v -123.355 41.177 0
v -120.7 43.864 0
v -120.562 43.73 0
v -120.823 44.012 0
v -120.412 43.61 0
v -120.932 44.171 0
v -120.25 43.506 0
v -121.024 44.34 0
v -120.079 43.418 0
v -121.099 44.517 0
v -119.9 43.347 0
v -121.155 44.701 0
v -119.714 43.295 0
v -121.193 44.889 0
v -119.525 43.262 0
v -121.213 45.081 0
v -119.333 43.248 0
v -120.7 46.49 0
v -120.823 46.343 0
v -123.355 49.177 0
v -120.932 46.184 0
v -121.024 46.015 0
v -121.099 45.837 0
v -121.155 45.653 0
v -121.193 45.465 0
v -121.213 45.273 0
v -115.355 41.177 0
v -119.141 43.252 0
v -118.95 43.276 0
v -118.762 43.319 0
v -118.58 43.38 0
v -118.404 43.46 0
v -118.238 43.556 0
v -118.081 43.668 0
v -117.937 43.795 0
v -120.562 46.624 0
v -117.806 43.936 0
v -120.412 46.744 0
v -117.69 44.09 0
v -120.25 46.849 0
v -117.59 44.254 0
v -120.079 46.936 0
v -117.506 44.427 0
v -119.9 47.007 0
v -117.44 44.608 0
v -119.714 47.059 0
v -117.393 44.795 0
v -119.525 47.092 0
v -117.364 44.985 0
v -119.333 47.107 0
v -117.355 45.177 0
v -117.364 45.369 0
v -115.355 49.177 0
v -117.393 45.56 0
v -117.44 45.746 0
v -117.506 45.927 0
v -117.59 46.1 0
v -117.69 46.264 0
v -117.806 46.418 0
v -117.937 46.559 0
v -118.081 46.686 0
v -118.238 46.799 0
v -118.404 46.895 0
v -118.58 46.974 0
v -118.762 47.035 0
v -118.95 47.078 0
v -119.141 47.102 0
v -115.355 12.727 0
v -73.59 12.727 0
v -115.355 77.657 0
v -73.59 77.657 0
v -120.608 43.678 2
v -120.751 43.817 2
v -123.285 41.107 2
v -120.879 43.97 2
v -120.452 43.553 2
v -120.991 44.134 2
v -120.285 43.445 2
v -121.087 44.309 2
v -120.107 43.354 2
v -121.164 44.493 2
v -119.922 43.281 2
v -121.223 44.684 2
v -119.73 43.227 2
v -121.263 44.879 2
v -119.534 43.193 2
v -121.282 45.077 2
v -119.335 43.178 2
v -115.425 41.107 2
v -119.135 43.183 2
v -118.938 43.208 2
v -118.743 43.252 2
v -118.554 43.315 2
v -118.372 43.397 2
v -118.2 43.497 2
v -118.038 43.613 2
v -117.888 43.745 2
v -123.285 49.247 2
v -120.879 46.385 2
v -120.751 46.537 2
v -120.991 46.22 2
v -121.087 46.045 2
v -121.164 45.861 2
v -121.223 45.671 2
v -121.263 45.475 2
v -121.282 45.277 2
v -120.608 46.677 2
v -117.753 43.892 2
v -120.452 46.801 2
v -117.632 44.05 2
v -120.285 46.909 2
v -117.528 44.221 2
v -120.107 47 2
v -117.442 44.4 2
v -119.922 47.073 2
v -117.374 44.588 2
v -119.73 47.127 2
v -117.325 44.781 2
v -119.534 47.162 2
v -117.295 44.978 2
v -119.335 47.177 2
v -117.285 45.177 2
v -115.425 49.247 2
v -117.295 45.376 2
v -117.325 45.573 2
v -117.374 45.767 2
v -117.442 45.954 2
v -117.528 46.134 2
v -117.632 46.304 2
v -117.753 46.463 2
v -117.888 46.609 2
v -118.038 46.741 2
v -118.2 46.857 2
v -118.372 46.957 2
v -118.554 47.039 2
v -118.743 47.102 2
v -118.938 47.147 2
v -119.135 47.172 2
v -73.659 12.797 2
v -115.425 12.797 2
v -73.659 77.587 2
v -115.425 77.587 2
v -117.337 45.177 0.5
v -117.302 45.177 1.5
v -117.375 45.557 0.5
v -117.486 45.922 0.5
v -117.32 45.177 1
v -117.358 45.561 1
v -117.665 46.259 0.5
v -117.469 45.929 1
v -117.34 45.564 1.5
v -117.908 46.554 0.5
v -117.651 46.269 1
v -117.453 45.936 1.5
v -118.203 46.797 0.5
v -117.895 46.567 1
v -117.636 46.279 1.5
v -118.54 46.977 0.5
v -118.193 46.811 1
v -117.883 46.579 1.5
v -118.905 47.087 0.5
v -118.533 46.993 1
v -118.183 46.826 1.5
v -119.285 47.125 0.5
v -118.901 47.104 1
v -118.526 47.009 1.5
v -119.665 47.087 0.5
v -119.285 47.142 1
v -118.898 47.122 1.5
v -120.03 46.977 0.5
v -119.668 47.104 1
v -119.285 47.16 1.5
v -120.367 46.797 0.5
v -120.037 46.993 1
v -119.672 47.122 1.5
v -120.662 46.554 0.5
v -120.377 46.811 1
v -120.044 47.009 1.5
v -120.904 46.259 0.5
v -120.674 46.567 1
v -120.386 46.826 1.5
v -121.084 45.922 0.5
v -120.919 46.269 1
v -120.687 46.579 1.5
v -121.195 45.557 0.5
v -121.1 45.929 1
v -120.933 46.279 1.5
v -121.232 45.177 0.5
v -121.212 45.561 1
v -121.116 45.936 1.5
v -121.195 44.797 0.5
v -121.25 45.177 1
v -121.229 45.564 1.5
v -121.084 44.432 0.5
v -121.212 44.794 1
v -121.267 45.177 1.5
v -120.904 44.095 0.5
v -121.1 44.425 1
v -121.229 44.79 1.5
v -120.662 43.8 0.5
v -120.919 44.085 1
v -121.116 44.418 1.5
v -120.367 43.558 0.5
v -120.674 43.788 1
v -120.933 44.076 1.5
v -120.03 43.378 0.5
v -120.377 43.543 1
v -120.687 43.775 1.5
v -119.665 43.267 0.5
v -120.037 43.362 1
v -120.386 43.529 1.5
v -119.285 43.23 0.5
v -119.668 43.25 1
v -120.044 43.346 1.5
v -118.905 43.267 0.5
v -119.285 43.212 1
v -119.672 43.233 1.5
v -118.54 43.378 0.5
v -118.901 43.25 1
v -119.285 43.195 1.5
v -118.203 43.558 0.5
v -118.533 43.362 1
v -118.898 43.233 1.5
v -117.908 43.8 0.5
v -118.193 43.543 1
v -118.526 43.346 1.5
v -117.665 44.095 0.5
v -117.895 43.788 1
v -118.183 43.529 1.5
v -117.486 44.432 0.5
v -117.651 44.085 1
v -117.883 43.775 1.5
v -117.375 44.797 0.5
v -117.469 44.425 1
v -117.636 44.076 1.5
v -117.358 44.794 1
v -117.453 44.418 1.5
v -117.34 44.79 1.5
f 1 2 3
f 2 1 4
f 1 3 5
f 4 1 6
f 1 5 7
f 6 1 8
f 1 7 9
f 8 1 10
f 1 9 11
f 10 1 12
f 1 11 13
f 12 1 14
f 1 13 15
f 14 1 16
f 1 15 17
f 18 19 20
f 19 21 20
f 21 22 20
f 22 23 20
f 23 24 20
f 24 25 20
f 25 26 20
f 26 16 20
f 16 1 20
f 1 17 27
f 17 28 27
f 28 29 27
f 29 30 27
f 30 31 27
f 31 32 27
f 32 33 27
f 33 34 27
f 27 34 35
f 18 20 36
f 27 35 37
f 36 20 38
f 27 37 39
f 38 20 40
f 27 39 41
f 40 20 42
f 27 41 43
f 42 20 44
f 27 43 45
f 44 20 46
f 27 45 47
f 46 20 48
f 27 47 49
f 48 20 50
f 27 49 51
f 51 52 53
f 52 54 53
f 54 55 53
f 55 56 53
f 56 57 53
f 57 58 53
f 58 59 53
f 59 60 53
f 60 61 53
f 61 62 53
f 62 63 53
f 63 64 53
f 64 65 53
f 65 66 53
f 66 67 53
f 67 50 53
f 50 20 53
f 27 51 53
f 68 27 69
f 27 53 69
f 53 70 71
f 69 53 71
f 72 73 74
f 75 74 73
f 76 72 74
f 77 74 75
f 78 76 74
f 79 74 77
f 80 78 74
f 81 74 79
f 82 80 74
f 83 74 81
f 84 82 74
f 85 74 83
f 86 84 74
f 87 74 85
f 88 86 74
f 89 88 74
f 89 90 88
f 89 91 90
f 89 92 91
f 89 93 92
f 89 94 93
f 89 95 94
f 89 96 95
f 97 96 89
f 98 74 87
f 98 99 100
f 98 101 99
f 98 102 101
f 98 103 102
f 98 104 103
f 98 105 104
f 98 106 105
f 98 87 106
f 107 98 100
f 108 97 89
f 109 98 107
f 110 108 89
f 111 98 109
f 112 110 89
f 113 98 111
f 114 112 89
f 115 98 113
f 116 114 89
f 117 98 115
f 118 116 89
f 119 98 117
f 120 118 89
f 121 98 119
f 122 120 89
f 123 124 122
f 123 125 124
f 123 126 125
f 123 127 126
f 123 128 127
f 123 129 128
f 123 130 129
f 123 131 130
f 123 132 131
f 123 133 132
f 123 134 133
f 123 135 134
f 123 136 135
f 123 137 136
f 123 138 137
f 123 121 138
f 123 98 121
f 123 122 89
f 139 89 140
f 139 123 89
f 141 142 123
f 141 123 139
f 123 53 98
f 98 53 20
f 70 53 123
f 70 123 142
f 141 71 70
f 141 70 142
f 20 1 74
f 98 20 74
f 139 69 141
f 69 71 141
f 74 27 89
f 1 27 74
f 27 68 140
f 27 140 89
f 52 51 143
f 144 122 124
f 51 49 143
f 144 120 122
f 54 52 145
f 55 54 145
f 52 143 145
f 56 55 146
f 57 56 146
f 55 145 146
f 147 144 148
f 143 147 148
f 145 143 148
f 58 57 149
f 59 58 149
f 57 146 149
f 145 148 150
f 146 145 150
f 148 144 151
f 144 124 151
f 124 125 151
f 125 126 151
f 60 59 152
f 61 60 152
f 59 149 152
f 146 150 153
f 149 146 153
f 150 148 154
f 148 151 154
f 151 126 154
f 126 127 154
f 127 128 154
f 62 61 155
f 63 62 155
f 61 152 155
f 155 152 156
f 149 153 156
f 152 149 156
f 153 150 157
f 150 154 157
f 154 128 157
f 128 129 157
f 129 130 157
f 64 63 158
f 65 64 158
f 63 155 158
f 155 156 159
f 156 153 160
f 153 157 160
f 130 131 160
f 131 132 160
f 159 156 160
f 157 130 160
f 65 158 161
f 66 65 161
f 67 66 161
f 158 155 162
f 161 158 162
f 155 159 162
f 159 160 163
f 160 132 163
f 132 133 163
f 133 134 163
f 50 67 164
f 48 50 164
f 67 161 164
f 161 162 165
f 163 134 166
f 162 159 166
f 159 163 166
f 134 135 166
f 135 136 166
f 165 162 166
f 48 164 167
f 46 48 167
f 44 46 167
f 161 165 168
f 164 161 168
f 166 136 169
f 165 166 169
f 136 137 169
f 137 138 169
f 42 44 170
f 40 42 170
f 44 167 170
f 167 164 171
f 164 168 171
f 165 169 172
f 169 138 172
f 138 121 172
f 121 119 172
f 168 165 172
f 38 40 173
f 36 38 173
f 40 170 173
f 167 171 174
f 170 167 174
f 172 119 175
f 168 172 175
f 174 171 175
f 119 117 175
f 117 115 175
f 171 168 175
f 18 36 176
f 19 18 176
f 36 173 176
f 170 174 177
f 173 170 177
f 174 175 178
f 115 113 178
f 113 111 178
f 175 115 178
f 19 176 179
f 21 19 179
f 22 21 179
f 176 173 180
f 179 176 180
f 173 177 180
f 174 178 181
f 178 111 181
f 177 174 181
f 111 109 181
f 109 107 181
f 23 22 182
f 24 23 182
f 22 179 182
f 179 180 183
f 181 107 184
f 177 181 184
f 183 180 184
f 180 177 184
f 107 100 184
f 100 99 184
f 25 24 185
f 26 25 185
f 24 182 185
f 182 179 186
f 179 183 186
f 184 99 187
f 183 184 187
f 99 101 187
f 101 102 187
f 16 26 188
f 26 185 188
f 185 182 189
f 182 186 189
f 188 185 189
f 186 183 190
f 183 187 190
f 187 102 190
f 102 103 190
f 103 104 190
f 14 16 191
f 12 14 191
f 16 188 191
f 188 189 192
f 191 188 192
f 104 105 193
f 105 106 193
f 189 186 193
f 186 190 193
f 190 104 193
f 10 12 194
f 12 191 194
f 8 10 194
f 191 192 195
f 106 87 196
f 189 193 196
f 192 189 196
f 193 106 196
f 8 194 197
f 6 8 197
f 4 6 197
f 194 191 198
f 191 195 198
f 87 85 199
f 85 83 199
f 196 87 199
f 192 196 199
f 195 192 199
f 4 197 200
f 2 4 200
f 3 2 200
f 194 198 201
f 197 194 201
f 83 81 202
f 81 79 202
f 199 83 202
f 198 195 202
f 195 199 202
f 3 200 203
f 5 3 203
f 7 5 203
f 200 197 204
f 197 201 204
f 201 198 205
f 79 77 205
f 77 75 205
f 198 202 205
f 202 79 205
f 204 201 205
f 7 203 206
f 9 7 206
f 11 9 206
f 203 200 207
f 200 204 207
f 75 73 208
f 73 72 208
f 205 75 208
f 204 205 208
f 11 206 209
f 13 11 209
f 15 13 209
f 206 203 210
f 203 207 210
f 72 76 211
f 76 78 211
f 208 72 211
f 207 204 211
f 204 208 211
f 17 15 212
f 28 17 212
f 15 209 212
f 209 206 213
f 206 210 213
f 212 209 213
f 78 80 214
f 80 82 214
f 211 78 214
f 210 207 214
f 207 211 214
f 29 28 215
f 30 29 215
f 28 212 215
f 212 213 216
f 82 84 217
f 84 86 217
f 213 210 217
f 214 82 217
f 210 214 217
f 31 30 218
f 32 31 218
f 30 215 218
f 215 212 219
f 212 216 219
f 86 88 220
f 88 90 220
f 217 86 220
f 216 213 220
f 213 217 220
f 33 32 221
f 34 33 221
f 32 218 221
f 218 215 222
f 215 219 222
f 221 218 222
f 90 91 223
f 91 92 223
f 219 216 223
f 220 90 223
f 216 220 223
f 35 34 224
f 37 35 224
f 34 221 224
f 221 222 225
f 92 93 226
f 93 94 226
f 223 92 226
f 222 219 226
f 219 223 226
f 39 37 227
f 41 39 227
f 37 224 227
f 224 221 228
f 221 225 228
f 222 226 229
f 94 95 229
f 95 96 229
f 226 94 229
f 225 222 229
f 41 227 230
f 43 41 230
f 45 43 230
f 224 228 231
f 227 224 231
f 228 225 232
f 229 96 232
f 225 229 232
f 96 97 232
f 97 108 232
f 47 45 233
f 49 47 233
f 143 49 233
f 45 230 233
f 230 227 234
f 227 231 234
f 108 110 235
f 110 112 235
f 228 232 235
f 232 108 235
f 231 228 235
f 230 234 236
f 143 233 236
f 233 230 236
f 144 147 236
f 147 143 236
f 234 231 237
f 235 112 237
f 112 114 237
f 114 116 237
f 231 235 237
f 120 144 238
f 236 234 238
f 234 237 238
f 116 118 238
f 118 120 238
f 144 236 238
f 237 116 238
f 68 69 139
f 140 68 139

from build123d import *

# Parameters (mm, degrees)
SKETCH1_W                    = 49.765070753
SKETCH1_H                    = 64.93
BOSS_EXTRUDE1_DEPTH          = 2
BOSS_EXTRUDE1_TAPER          = 2
SKETCH3_R                    = 2
CUT_EXTRUDE2_DEPTH           = 2
CUT_EXTRUDE2_DRAFT           = -2
SKETCH4_W                    = 8
SKETCH4_H                    = 28.479841539
CUT_EXTRUDE3_DEPTH           = 2
CUT_EXTRUDE3_DRAFT           = -2
SKETCH4_H_2                  = 28.450158461
CUT_EXTRUDE3_PROFILE_2_DEPTH = 2
CUT_EXTRUDE3_PROFILE_2_DRAFT = -2


with BuildPart() as part:
    # Sketch1 → Boss-Extrude1 (new body)
    with BuildSketch(Plane.XY):
        with Locations((-98.472172046, 45.191977318)):
            Rectangle(SKETCH1_W, SKETCH1_H)
    extrude(amount=BOSS_EXTRUDE1_DEPTH, taper=BOSS_EXTRUDE1_TAPER)


with BuildPart() as cut_extrude2_tool:
    # Sketch3 → Cut-Extrude2 (with draft: the straight prism first)
    with BuildSketch(Plane.XY.offset(2)):
        with Locations((-119.284865883, 45.177135779)):
            Circle(SKETCH3_R)
    extrude(amount=-CUT_EXTRUDE2_DEPTH)
    # Cut-Extrude2: the draft: its side faces are tilted about the plane it starts from
    cut_extrude2_sides = [cut_extrude2_tool.faces().sort_by_distance(p)[0] for p in [
        (-121.284865883, 45.177135779, 1),
    ]]
    draft(cut_extrude2_sides, Plane.XY.offset(2), CUT_EXTRUDE2_DRAFT)


with BuildPart() as part_1:
    add(part.part)

    # Cut-Extrude2: cut by cut_extrude2_tool
    add(cut_extrude2_tool.part, mode=Mode.SUBTRACT)


with BuildPart() as cut_extrude3_tool:
    # Sketch4 → Cut-Extrude3 (with draft: the straight prism first)
    with BuildSketch(Plane(origin=(0, 0, 0), x_dir=(-1, 0, 0), z_dir=(0, 0, -1))):
        with Locations((119.354707422, 63.417056548)):
            Rectangle(SKETCH4_W, SKETCH4_H)
    extrude(amount=-CUT_EXTRUDE3_DEPTH)
    # Cut-Extrude3: the draft: its side faces are tilted about the plane it starts from
    cut_extrude3_sides = [cut_extrude3_tool.faces().sort_by_distance(p)[0] for p in [
        (-119.354707422, 77.656977318, 1),
        (-115.354707422, 63.417056548, 1),
        (-119.354707422, 49.177135779, 1),
        (-123.354707422, 63.417056548, 1),
    ]]
    draft(cut_extrude3_sides, Plane(origin=(0, 0, 0), x_dir=(-1, 0, 0), z_dir=(0, 0, -1)), CUT_EXTRUDE3_DRAFT)


with BuildPart() as part_2:
    add(part_1.part)

    # Cut-Extrude3: cut by cut_extrude3_tool
    add(cut_extrude3_tool.part, mode=Mode.SUBTRACT)


with BuildPart() as cut_extrude3_profile_2_tool:
    # Sketch4 → Cut-Extrude3 profile 2 (with draft: the straight prism first)
    with BuildSketch(Plane(origin=(0, 0, 0), x_dir=(-1, 0, 0), z_dir=(0, 0, -1))):
        with Locations((119.354707422, 26.952056549)):
            Rectangle(SKETCH4_W, SKETCH4_H_2)
    extrude(amount=-CUT_EXTRUDE3_PROFILE_2_DEPTH)
    # Cut-Extrude3 profile 2: the draft: its side faces are tilted about the plane it starts from
    cut_extrude3_profile_2_sides = [cut_extrude3_profile_2_tool.faces().sort_by_distance(p)[0] for p in [
        (-123.354707422, 26.952056548, 1),
        (-119.354707422, 41.177135779, 1),
        (-115.354707422, 26.952056548, 1),
        (-119.354707422, 12.726977318, 1),
    ]]
    draft(cut_extrude3_profile_2_sides, Plane(origin=(0, 0, 0), x_dir=(-1, 0, 0), z_dir=(0, 0, -1)), CUT_EXTRUDE3_PROFILE_2_DRAFT)


with BuildPart() as part_3:
    add(part_2.part)

    # Cut-Extrude3 profile 2: cut by cut_extrude3_profile_2_tool
    add(cut_extrude3_profile_2_tool.part, mode=Mode.SUBTRACT)


solid = part_3.part
